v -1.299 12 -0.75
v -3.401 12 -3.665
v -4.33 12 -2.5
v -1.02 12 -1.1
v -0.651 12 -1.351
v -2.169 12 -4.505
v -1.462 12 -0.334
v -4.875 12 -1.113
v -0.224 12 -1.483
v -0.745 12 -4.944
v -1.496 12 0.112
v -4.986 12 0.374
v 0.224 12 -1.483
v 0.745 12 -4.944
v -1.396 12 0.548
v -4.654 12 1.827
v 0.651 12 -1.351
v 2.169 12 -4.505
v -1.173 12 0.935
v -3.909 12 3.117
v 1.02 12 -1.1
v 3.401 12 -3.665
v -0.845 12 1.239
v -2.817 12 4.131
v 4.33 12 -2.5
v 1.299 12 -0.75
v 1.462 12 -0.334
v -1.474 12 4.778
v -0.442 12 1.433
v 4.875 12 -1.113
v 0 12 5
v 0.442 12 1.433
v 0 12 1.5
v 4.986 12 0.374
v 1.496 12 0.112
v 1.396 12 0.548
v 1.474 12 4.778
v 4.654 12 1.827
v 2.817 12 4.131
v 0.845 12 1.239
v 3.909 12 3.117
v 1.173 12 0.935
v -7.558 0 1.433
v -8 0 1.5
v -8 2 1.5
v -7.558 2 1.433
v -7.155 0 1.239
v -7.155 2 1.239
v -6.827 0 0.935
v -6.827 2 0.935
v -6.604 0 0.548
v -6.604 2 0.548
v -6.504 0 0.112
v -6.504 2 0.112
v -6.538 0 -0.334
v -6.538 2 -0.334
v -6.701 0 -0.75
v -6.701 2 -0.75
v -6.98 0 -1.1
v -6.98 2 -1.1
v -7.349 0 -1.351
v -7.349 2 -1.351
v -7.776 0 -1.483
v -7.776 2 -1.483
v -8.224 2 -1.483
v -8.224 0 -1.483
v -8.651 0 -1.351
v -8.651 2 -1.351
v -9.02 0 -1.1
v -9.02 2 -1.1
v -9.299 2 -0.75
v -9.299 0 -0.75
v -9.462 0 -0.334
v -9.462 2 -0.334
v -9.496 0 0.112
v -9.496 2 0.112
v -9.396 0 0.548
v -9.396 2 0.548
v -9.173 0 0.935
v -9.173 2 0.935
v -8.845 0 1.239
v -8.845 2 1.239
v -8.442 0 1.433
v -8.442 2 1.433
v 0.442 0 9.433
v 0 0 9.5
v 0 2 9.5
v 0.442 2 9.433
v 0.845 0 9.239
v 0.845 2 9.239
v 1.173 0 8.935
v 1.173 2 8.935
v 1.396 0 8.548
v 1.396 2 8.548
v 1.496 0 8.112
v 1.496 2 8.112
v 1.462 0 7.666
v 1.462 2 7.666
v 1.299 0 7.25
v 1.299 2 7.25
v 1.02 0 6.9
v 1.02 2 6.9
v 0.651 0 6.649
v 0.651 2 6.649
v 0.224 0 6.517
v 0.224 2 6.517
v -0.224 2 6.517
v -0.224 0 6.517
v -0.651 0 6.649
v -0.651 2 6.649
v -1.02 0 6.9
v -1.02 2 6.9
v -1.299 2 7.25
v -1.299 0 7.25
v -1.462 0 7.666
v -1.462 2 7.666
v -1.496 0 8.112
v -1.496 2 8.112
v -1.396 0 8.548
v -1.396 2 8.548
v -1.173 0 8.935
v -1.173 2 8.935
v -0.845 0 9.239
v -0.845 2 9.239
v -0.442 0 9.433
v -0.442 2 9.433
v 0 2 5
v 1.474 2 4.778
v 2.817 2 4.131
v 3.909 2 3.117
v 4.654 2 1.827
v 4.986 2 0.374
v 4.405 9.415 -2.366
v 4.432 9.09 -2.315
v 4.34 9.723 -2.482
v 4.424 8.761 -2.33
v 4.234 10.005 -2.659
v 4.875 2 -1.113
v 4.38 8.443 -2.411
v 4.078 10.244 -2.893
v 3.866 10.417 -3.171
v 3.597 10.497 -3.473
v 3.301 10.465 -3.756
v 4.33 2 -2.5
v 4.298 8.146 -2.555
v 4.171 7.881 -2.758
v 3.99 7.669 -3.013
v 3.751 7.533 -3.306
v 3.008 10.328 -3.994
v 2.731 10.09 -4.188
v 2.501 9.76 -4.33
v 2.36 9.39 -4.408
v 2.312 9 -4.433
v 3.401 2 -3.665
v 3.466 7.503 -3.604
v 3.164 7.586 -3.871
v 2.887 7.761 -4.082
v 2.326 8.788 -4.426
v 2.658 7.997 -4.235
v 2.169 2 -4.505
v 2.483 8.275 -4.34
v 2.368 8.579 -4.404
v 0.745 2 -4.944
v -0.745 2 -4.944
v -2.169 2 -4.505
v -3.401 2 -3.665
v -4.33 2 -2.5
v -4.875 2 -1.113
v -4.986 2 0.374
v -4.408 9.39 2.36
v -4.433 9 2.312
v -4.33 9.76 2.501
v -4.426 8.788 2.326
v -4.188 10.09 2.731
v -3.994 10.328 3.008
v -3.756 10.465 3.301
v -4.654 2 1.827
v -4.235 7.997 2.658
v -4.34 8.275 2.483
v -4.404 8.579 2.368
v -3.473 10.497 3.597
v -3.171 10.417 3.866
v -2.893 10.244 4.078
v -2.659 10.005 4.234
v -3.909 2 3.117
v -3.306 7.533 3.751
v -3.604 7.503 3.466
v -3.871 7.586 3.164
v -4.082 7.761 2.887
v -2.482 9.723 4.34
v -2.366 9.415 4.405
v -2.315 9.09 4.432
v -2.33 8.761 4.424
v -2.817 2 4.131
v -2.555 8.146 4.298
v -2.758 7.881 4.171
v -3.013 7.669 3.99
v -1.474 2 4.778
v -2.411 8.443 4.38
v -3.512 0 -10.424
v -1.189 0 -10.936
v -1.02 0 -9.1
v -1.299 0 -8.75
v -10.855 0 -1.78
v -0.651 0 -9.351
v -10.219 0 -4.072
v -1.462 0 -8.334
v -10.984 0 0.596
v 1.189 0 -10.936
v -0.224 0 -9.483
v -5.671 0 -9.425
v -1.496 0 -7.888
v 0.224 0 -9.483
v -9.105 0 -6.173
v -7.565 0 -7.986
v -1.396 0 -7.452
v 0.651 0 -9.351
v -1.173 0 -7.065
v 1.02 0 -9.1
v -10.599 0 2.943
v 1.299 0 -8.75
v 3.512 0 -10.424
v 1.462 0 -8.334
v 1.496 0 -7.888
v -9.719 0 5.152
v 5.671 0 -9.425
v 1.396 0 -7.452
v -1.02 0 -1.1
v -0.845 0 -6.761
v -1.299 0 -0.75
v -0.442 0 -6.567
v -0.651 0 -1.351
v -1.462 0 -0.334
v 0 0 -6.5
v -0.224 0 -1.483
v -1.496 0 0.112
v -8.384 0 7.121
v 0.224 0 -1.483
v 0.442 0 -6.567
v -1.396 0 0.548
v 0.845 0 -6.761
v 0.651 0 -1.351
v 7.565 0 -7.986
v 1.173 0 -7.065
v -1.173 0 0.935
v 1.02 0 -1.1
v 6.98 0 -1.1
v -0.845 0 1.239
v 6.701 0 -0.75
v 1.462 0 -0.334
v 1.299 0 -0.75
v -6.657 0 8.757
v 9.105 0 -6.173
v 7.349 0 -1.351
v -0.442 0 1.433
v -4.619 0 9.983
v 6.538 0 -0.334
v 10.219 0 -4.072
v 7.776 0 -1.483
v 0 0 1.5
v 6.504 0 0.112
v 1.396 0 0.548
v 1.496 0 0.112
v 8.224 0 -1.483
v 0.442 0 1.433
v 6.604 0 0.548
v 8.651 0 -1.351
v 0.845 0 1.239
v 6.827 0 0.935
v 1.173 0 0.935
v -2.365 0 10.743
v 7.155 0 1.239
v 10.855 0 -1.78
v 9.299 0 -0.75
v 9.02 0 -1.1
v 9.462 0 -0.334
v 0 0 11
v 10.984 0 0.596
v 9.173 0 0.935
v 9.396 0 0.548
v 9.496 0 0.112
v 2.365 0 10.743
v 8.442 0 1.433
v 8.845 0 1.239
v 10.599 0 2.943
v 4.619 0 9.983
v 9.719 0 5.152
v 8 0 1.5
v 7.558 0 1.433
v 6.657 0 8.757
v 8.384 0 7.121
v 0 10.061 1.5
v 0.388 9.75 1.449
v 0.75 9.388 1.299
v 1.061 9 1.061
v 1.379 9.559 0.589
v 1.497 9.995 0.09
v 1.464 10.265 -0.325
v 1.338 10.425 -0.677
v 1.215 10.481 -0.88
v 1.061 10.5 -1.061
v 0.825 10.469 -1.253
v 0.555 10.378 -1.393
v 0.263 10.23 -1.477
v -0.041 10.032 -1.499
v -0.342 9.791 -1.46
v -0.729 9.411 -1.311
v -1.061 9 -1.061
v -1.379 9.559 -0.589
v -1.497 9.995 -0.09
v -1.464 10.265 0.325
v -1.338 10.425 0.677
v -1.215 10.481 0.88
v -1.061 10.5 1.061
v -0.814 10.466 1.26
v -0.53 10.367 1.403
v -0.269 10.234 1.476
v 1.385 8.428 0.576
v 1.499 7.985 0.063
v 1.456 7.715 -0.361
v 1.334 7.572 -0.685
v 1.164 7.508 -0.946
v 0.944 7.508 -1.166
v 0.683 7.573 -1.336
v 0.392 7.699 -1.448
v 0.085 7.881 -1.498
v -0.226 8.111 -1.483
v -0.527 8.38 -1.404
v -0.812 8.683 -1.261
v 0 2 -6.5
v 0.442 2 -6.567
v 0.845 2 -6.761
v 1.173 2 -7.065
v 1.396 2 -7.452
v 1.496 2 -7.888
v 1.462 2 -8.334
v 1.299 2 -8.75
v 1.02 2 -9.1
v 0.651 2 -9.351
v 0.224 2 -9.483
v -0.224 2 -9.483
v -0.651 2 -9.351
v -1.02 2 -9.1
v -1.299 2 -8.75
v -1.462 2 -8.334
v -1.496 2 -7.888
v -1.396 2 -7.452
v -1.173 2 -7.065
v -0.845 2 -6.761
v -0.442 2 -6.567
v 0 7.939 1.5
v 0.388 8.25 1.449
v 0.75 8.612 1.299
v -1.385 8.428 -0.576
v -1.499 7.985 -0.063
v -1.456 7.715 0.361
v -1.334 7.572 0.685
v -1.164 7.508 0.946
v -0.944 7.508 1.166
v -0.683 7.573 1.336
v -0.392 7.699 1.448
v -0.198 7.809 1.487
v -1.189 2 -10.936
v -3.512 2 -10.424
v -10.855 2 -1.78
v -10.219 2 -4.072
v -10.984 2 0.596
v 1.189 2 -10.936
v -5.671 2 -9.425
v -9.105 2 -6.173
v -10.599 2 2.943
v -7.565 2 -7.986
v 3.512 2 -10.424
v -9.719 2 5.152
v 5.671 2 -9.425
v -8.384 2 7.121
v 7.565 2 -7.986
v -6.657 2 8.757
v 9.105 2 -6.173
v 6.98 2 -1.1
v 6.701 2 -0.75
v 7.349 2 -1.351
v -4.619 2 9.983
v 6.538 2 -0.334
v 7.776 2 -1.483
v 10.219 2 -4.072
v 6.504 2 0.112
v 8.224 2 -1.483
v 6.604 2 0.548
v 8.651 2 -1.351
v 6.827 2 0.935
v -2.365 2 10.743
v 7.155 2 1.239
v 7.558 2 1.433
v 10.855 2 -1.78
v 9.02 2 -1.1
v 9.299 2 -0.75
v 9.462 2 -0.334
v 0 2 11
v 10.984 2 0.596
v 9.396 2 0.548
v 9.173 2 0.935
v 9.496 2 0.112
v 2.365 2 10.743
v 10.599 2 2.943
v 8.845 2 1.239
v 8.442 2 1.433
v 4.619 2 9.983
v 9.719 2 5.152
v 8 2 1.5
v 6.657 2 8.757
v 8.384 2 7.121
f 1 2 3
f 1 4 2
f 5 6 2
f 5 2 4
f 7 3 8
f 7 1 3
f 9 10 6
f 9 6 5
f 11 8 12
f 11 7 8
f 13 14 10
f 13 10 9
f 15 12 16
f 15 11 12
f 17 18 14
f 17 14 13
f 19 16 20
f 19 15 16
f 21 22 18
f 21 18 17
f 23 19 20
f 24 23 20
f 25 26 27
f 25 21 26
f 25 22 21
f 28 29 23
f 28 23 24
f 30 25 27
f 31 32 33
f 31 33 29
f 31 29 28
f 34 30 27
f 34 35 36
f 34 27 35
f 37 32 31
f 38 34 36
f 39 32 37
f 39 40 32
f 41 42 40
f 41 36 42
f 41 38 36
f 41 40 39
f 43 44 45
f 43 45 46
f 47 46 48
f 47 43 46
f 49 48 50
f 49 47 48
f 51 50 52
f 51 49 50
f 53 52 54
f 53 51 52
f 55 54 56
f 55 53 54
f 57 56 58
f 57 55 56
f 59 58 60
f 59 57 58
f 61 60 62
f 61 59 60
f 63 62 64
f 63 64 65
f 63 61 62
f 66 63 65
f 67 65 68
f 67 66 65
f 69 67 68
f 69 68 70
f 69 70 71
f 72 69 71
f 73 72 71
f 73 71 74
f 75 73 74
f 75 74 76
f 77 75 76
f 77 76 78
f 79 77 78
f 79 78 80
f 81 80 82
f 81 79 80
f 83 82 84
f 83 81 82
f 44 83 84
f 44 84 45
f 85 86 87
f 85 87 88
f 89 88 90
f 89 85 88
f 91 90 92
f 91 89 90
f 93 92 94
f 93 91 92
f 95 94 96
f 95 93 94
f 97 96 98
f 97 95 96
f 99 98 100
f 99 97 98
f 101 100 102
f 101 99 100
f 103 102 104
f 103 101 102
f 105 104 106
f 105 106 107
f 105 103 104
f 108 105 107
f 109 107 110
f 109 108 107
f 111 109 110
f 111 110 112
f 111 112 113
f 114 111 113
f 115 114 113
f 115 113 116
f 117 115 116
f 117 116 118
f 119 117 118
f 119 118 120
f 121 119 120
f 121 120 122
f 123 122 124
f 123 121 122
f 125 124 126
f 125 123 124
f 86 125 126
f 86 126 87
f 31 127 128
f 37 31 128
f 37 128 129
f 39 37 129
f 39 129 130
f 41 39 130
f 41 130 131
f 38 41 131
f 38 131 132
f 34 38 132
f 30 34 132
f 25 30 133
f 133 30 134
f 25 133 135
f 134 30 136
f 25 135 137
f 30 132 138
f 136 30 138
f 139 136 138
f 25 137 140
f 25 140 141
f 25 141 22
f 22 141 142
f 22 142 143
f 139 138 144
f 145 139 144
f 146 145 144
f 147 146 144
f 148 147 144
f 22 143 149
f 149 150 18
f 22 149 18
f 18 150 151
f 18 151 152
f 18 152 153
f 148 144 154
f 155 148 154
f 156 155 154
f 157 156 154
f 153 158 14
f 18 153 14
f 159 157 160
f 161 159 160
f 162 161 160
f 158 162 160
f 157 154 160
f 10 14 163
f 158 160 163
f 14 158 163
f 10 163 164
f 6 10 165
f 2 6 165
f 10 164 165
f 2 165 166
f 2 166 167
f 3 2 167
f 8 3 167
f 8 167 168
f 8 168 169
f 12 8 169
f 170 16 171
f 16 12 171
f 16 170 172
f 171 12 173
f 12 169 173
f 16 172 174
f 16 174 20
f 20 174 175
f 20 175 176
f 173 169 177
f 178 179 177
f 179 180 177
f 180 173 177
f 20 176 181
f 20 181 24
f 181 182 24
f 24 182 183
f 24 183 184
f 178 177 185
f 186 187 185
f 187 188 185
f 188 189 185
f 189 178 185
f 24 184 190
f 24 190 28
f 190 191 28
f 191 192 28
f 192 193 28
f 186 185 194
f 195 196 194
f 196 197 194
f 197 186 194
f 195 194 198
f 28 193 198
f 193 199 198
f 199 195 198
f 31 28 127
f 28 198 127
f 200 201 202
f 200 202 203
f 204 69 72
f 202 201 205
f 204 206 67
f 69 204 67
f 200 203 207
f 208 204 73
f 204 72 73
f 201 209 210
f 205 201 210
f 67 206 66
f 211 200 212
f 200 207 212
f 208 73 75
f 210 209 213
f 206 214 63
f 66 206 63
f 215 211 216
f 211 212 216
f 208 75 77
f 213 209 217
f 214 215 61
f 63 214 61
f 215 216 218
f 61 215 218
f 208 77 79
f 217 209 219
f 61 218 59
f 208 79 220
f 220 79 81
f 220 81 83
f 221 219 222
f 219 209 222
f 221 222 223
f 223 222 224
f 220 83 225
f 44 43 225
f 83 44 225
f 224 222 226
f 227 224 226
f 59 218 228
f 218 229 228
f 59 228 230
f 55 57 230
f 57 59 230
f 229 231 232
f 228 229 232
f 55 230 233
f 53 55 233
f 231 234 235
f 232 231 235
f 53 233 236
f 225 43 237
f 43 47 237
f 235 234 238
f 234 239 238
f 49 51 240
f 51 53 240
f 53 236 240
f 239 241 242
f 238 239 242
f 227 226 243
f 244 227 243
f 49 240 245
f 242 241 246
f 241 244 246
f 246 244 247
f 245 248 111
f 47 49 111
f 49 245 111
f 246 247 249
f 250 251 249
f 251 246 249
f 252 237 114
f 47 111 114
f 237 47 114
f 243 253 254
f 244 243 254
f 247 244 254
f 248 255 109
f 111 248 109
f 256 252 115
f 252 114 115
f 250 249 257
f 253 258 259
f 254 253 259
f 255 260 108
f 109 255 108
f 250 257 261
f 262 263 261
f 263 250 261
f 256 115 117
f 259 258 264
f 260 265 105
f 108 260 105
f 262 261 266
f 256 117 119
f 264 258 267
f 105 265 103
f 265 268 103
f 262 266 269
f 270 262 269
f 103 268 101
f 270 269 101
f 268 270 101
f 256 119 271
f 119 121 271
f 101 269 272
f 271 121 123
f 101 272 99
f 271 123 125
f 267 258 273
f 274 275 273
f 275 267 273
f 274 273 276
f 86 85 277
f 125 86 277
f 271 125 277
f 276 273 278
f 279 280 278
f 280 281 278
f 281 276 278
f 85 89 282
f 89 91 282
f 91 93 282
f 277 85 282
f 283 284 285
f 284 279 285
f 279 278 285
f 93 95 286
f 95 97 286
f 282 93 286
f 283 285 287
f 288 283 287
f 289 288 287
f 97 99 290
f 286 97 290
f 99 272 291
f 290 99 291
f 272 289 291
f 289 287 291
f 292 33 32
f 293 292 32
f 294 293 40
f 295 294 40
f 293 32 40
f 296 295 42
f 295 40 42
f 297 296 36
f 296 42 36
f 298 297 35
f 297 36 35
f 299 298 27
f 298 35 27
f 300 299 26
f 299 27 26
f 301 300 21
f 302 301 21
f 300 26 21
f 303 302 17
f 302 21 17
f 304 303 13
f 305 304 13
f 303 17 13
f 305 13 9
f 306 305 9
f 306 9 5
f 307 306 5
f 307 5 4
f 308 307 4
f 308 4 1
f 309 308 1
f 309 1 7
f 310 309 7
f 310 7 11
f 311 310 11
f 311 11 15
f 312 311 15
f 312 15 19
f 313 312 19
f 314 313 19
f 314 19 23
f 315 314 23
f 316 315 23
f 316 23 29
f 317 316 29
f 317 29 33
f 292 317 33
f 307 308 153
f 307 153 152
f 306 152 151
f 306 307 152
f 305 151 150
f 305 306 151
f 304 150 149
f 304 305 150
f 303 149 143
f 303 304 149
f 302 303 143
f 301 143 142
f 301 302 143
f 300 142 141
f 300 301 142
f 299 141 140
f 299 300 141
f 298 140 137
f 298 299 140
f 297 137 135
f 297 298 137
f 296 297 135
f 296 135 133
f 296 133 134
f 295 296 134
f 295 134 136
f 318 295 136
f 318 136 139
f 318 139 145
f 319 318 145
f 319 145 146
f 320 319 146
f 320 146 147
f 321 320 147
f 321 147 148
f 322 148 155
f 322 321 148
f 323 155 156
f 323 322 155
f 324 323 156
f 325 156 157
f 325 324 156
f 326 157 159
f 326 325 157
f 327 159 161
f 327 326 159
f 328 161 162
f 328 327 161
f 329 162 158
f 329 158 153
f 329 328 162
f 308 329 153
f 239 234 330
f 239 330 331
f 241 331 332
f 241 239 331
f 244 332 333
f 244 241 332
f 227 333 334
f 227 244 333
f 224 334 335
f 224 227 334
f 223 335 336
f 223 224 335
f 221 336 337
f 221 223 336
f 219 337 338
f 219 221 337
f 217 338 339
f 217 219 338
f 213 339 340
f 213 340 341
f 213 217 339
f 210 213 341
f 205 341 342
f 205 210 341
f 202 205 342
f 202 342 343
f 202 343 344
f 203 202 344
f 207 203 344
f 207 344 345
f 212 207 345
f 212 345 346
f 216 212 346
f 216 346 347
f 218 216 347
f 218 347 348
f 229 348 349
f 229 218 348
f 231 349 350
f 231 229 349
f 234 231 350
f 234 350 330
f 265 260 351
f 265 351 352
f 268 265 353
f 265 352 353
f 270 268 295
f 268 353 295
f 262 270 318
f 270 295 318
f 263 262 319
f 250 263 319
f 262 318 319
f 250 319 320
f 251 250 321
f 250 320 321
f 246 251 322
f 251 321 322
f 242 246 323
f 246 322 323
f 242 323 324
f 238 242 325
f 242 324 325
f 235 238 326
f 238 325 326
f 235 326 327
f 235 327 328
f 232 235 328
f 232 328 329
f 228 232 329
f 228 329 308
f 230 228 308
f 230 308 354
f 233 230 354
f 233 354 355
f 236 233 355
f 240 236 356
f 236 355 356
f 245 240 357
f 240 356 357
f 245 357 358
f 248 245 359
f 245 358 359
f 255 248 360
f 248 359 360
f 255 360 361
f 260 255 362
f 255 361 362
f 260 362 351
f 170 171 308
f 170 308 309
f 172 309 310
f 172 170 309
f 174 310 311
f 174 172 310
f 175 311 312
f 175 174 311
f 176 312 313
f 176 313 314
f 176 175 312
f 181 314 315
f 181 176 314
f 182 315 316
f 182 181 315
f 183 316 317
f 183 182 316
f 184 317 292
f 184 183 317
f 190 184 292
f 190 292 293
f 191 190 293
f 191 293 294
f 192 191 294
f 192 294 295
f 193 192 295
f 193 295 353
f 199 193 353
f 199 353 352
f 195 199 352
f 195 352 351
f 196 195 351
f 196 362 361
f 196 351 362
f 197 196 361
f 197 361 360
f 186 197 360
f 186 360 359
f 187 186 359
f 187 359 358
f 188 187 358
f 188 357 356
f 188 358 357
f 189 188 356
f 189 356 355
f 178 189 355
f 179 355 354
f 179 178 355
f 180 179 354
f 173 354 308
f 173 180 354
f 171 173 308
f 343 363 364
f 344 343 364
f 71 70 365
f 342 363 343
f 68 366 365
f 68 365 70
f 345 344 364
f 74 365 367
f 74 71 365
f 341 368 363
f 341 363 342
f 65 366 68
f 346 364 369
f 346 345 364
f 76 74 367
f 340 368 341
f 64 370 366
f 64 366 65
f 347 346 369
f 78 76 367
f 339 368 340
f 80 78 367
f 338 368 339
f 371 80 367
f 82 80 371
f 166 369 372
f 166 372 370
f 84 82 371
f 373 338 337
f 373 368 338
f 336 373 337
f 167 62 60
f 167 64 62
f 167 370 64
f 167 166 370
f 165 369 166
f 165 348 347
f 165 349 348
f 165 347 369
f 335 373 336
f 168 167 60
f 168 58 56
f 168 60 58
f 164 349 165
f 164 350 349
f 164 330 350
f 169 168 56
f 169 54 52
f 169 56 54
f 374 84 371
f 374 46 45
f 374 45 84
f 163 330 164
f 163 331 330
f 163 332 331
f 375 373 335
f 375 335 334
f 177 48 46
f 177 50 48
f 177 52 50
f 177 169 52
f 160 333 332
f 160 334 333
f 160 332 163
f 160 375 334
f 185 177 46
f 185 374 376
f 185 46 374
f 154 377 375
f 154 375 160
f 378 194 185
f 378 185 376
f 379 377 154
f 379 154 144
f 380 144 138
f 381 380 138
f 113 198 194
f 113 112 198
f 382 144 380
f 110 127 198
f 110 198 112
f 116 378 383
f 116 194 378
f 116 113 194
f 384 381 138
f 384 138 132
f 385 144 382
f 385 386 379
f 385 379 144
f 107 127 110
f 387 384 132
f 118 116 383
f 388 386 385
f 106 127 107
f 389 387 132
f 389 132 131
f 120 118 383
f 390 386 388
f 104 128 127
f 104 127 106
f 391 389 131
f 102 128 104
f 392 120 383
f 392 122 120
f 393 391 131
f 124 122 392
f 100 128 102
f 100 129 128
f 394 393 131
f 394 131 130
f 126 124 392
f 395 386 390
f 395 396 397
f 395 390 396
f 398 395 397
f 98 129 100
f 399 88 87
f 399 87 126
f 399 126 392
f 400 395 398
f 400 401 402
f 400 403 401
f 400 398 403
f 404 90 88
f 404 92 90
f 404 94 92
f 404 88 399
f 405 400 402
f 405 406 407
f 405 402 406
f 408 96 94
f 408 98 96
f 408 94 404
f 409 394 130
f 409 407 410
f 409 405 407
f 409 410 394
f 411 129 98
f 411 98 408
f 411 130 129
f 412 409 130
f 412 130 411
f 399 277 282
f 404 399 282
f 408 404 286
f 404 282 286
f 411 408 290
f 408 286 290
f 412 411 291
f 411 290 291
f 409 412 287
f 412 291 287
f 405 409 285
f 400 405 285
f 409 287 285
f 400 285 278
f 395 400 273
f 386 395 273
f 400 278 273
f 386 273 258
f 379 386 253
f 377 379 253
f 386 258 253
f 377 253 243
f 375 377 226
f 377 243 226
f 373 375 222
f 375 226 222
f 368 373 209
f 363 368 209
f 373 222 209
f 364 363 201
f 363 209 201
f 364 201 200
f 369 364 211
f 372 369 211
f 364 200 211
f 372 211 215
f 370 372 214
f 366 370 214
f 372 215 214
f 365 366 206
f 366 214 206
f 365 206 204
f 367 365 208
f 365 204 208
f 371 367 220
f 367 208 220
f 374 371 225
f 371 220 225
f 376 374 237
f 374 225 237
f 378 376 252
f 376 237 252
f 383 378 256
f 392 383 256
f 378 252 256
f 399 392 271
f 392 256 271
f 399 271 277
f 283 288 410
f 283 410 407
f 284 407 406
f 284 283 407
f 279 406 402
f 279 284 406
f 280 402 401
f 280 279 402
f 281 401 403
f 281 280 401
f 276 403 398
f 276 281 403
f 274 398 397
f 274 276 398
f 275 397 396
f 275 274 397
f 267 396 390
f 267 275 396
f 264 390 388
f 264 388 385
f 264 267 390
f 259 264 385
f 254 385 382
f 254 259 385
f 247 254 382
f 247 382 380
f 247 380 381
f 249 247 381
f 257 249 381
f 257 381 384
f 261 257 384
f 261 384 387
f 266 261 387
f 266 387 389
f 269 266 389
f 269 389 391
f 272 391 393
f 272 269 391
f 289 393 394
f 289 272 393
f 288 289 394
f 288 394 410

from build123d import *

# Parameters (mm, degrees)
SKETCH_1_R               = 11
SKETCH_1_R_2             = 1.5
EXTRUDE_1_DEPTH          = 2
SKETCH_2_R               = 5
EXTRUDE_2_DEPTH          = 10
SKETCH_3_R               = 1.5
CUT_EXTRUDE_1_DEPTH      = 20.646882704
CUT_EXTRUDE_2_DEPTH      = 20.646882704
CUT_EXTRUDE_2_DEPTH_BACK = 20.646882704
SKETCH_5_R               = 1.5


with BuildPart() as part:
    # 草圖1 → 填料-伸長1 (new body)
    with BuildSketch(Plane(origin=(0, 0, 0), x_dir=(1, 0, 0), z_dir=(0, 1, 0))):
        with Locations(Location((0, 0, 0), (0, 0, 270))):
            Circle(SKETCH_1_R)
        with Locations(Location((0, 8, 0), (0, 0, 270))):
            Circle(SKETCH_1_R_2, mode=Mode.SUBTRACT)
        with Locations(Location((8, 0, 0), (0, 0, 270))):
            Circle(SKETCH_1_R_2, mode=Mode.SUBTRACT)
        with Locations(Location((0, -8, 0), (0, 0, 270))):
            Circle(SKETCH_1_R_2, mode=Mode.SUBTRACT)
        with Locations(Location((-8, 0, 0), (0, 0, 270))):
            Circle(SKETCH_1_R_2, mode=Mode.SUBTRACT)
    extrude(amount=EXTRUDE_1_DEPTH)

    # 草圖2 → 填料-伸長2 (add)
    with BuildSketch(Plane(origin=(0, 2, 0), x_dir=(1, 0, 0), z_dir=(0, 1, 0))):
        with Locations(Location((0, 0, 0), (0, 0, 270))):
            Circle(SKETCH_2_R)
    extrude(amount=EXTRUDE_2_DEPTH)

    # 草圖3 → 除料-伸長1 (cut, through all)
    with BuildSketch(Plane(origin=(0, 12, 0), x_dir=(1, 0, 0), z_dir=(0, 1, 0))):
        with Locations(Location((0, 0, 0), (0, 0, 270))):
            Circle(SKETCH_3_R)
    extrude(amount=-CUT_EXTRUDE_1_DEPTH, mode=Mode.SUBTRACT)

    # 草圖5 → 除料-伸長2 (cut, two sides: drawn at the far end of the back side and taken through both)
    with BuildSketch(Plane(origin=(0, 0, 0), x_dir=(-0.7071067811865476, 0, -0.7071067811865476), z_dir=(0.7071067811865476, 0, -0.7071067811865476)).offset(-CUT_EXTRUDE_2_DEPTH_BACK)):
        with Locations((0, 9)):
            Circle(SKETCH_5_R)
    extrude(amount=CUT_EXTRUDE_2_DEPTH + CUT_EXTRUDE_2_DEPTH_BACK, mode=Mode.SUBTRACT)


solid = part.part
